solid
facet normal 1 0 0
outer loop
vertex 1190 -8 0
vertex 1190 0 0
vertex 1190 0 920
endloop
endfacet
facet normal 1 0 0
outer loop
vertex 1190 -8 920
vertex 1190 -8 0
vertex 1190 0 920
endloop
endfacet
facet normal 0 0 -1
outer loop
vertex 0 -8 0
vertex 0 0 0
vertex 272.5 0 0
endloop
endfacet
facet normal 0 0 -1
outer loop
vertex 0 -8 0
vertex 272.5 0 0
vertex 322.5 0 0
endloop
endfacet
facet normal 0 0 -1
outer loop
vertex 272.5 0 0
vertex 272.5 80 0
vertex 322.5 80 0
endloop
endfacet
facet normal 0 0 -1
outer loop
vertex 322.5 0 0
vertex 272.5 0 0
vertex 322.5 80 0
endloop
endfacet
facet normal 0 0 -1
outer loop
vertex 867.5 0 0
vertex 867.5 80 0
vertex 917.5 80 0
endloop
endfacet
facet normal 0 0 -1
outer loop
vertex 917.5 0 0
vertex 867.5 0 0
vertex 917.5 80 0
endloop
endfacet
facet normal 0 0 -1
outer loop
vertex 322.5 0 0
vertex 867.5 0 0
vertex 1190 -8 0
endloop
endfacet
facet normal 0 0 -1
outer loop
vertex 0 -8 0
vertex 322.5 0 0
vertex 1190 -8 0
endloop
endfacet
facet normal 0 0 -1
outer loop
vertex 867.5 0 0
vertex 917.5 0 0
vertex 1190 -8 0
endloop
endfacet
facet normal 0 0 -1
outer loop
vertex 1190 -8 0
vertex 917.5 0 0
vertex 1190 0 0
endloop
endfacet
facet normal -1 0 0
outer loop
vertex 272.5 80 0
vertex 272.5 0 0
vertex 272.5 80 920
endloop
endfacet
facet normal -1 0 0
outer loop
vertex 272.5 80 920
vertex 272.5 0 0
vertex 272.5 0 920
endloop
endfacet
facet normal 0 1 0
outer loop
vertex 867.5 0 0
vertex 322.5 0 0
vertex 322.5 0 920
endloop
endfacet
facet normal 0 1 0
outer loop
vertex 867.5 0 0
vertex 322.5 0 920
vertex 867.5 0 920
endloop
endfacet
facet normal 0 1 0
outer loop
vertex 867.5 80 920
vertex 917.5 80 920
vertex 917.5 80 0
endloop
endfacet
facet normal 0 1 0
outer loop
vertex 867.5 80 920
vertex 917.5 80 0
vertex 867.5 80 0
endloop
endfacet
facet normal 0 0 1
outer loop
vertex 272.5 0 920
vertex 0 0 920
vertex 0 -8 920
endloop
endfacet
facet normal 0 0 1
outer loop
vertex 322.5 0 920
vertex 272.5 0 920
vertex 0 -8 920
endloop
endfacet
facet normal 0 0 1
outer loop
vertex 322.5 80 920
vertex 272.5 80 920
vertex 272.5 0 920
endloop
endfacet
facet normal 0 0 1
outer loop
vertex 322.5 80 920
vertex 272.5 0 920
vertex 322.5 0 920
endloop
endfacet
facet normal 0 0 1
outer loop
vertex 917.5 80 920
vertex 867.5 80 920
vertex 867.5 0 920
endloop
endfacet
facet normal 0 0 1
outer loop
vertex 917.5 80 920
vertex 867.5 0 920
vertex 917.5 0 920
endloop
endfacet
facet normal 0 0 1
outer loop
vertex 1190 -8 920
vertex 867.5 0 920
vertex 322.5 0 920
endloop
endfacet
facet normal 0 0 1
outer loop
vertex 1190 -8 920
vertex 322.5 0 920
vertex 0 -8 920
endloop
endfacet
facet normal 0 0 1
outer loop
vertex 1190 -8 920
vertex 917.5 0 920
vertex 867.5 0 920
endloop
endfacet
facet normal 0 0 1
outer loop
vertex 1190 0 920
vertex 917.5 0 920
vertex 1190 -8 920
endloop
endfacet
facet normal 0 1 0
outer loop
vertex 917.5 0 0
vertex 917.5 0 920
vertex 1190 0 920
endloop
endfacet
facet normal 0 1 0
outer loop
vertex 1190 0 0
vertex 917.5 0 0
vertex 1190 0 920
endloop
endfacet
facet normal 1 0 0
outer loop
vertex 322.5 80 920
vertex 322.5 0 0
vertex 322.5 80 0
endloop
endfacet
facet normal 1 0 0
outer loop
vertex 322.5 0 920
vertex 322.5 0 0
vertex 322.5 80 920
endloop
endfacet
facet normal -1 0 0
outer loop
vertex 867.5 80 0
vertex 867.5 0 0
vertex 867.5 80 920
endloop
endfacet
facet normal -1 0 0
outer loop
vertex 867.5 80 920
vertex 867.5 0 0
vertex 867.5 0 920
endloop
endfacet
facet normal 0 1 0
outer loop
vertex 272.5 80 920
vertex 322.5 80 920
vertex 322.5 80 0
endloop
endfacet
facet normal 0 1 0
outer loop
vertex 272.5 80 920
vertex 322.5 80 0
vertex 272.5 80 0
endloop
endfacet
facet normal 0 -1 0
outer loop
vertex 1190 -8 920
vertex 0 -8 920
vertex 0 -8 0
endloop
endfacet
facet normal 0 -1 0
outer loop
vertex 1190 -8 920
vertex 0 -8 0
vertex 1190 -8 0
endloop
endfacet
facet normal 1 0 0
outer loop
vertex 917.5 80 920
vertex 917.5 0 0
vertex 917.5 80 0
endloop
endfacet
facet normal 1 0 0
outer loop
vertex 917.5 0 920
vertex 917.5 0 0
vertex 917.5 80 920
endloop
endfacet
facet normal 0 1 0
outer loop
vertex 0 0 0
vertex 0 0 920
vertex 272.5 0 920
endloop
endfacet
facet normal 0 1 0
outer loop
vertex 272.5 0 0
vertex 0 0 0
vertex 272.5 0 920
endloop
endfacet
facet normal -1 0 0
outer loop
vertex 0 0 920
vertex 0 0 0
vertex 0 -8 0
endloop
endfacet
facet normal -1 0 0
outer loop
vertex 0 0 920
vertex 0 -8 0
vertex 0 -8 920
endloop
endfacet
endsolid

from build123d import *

# Parameters (mm, degrees)
F0_W     = 1190
F0_H     = 920
F1_DEPTH = 8
F2_W     = 50
F2_H     = 920
F3_DEPTH = 80


with BuildPart() as f1:
    # F0 (on Front) → F1 (new body)
    with BuildSketch(Plane.XZ):
        with Locations((595, 460)):
            Rectangle(F0_W, F0_H)
    extrude(amount=F1_DEPTH)

    # F2 (on face) → F3 (join)
    with BuildSketch(Plane(origin=(0, 0, 0), x_dir=(-1, 0, 0), z_dir=(0, 1, 0))):
        with Locations((-892.5, 460)):
            Rectangle(F2_W, F2_H)
        with Locations((-297.5, 460)):
            Rectangle(F2_W, F2_H)
    extrude(amount=F3_DEPTH)


solid = f1.part
